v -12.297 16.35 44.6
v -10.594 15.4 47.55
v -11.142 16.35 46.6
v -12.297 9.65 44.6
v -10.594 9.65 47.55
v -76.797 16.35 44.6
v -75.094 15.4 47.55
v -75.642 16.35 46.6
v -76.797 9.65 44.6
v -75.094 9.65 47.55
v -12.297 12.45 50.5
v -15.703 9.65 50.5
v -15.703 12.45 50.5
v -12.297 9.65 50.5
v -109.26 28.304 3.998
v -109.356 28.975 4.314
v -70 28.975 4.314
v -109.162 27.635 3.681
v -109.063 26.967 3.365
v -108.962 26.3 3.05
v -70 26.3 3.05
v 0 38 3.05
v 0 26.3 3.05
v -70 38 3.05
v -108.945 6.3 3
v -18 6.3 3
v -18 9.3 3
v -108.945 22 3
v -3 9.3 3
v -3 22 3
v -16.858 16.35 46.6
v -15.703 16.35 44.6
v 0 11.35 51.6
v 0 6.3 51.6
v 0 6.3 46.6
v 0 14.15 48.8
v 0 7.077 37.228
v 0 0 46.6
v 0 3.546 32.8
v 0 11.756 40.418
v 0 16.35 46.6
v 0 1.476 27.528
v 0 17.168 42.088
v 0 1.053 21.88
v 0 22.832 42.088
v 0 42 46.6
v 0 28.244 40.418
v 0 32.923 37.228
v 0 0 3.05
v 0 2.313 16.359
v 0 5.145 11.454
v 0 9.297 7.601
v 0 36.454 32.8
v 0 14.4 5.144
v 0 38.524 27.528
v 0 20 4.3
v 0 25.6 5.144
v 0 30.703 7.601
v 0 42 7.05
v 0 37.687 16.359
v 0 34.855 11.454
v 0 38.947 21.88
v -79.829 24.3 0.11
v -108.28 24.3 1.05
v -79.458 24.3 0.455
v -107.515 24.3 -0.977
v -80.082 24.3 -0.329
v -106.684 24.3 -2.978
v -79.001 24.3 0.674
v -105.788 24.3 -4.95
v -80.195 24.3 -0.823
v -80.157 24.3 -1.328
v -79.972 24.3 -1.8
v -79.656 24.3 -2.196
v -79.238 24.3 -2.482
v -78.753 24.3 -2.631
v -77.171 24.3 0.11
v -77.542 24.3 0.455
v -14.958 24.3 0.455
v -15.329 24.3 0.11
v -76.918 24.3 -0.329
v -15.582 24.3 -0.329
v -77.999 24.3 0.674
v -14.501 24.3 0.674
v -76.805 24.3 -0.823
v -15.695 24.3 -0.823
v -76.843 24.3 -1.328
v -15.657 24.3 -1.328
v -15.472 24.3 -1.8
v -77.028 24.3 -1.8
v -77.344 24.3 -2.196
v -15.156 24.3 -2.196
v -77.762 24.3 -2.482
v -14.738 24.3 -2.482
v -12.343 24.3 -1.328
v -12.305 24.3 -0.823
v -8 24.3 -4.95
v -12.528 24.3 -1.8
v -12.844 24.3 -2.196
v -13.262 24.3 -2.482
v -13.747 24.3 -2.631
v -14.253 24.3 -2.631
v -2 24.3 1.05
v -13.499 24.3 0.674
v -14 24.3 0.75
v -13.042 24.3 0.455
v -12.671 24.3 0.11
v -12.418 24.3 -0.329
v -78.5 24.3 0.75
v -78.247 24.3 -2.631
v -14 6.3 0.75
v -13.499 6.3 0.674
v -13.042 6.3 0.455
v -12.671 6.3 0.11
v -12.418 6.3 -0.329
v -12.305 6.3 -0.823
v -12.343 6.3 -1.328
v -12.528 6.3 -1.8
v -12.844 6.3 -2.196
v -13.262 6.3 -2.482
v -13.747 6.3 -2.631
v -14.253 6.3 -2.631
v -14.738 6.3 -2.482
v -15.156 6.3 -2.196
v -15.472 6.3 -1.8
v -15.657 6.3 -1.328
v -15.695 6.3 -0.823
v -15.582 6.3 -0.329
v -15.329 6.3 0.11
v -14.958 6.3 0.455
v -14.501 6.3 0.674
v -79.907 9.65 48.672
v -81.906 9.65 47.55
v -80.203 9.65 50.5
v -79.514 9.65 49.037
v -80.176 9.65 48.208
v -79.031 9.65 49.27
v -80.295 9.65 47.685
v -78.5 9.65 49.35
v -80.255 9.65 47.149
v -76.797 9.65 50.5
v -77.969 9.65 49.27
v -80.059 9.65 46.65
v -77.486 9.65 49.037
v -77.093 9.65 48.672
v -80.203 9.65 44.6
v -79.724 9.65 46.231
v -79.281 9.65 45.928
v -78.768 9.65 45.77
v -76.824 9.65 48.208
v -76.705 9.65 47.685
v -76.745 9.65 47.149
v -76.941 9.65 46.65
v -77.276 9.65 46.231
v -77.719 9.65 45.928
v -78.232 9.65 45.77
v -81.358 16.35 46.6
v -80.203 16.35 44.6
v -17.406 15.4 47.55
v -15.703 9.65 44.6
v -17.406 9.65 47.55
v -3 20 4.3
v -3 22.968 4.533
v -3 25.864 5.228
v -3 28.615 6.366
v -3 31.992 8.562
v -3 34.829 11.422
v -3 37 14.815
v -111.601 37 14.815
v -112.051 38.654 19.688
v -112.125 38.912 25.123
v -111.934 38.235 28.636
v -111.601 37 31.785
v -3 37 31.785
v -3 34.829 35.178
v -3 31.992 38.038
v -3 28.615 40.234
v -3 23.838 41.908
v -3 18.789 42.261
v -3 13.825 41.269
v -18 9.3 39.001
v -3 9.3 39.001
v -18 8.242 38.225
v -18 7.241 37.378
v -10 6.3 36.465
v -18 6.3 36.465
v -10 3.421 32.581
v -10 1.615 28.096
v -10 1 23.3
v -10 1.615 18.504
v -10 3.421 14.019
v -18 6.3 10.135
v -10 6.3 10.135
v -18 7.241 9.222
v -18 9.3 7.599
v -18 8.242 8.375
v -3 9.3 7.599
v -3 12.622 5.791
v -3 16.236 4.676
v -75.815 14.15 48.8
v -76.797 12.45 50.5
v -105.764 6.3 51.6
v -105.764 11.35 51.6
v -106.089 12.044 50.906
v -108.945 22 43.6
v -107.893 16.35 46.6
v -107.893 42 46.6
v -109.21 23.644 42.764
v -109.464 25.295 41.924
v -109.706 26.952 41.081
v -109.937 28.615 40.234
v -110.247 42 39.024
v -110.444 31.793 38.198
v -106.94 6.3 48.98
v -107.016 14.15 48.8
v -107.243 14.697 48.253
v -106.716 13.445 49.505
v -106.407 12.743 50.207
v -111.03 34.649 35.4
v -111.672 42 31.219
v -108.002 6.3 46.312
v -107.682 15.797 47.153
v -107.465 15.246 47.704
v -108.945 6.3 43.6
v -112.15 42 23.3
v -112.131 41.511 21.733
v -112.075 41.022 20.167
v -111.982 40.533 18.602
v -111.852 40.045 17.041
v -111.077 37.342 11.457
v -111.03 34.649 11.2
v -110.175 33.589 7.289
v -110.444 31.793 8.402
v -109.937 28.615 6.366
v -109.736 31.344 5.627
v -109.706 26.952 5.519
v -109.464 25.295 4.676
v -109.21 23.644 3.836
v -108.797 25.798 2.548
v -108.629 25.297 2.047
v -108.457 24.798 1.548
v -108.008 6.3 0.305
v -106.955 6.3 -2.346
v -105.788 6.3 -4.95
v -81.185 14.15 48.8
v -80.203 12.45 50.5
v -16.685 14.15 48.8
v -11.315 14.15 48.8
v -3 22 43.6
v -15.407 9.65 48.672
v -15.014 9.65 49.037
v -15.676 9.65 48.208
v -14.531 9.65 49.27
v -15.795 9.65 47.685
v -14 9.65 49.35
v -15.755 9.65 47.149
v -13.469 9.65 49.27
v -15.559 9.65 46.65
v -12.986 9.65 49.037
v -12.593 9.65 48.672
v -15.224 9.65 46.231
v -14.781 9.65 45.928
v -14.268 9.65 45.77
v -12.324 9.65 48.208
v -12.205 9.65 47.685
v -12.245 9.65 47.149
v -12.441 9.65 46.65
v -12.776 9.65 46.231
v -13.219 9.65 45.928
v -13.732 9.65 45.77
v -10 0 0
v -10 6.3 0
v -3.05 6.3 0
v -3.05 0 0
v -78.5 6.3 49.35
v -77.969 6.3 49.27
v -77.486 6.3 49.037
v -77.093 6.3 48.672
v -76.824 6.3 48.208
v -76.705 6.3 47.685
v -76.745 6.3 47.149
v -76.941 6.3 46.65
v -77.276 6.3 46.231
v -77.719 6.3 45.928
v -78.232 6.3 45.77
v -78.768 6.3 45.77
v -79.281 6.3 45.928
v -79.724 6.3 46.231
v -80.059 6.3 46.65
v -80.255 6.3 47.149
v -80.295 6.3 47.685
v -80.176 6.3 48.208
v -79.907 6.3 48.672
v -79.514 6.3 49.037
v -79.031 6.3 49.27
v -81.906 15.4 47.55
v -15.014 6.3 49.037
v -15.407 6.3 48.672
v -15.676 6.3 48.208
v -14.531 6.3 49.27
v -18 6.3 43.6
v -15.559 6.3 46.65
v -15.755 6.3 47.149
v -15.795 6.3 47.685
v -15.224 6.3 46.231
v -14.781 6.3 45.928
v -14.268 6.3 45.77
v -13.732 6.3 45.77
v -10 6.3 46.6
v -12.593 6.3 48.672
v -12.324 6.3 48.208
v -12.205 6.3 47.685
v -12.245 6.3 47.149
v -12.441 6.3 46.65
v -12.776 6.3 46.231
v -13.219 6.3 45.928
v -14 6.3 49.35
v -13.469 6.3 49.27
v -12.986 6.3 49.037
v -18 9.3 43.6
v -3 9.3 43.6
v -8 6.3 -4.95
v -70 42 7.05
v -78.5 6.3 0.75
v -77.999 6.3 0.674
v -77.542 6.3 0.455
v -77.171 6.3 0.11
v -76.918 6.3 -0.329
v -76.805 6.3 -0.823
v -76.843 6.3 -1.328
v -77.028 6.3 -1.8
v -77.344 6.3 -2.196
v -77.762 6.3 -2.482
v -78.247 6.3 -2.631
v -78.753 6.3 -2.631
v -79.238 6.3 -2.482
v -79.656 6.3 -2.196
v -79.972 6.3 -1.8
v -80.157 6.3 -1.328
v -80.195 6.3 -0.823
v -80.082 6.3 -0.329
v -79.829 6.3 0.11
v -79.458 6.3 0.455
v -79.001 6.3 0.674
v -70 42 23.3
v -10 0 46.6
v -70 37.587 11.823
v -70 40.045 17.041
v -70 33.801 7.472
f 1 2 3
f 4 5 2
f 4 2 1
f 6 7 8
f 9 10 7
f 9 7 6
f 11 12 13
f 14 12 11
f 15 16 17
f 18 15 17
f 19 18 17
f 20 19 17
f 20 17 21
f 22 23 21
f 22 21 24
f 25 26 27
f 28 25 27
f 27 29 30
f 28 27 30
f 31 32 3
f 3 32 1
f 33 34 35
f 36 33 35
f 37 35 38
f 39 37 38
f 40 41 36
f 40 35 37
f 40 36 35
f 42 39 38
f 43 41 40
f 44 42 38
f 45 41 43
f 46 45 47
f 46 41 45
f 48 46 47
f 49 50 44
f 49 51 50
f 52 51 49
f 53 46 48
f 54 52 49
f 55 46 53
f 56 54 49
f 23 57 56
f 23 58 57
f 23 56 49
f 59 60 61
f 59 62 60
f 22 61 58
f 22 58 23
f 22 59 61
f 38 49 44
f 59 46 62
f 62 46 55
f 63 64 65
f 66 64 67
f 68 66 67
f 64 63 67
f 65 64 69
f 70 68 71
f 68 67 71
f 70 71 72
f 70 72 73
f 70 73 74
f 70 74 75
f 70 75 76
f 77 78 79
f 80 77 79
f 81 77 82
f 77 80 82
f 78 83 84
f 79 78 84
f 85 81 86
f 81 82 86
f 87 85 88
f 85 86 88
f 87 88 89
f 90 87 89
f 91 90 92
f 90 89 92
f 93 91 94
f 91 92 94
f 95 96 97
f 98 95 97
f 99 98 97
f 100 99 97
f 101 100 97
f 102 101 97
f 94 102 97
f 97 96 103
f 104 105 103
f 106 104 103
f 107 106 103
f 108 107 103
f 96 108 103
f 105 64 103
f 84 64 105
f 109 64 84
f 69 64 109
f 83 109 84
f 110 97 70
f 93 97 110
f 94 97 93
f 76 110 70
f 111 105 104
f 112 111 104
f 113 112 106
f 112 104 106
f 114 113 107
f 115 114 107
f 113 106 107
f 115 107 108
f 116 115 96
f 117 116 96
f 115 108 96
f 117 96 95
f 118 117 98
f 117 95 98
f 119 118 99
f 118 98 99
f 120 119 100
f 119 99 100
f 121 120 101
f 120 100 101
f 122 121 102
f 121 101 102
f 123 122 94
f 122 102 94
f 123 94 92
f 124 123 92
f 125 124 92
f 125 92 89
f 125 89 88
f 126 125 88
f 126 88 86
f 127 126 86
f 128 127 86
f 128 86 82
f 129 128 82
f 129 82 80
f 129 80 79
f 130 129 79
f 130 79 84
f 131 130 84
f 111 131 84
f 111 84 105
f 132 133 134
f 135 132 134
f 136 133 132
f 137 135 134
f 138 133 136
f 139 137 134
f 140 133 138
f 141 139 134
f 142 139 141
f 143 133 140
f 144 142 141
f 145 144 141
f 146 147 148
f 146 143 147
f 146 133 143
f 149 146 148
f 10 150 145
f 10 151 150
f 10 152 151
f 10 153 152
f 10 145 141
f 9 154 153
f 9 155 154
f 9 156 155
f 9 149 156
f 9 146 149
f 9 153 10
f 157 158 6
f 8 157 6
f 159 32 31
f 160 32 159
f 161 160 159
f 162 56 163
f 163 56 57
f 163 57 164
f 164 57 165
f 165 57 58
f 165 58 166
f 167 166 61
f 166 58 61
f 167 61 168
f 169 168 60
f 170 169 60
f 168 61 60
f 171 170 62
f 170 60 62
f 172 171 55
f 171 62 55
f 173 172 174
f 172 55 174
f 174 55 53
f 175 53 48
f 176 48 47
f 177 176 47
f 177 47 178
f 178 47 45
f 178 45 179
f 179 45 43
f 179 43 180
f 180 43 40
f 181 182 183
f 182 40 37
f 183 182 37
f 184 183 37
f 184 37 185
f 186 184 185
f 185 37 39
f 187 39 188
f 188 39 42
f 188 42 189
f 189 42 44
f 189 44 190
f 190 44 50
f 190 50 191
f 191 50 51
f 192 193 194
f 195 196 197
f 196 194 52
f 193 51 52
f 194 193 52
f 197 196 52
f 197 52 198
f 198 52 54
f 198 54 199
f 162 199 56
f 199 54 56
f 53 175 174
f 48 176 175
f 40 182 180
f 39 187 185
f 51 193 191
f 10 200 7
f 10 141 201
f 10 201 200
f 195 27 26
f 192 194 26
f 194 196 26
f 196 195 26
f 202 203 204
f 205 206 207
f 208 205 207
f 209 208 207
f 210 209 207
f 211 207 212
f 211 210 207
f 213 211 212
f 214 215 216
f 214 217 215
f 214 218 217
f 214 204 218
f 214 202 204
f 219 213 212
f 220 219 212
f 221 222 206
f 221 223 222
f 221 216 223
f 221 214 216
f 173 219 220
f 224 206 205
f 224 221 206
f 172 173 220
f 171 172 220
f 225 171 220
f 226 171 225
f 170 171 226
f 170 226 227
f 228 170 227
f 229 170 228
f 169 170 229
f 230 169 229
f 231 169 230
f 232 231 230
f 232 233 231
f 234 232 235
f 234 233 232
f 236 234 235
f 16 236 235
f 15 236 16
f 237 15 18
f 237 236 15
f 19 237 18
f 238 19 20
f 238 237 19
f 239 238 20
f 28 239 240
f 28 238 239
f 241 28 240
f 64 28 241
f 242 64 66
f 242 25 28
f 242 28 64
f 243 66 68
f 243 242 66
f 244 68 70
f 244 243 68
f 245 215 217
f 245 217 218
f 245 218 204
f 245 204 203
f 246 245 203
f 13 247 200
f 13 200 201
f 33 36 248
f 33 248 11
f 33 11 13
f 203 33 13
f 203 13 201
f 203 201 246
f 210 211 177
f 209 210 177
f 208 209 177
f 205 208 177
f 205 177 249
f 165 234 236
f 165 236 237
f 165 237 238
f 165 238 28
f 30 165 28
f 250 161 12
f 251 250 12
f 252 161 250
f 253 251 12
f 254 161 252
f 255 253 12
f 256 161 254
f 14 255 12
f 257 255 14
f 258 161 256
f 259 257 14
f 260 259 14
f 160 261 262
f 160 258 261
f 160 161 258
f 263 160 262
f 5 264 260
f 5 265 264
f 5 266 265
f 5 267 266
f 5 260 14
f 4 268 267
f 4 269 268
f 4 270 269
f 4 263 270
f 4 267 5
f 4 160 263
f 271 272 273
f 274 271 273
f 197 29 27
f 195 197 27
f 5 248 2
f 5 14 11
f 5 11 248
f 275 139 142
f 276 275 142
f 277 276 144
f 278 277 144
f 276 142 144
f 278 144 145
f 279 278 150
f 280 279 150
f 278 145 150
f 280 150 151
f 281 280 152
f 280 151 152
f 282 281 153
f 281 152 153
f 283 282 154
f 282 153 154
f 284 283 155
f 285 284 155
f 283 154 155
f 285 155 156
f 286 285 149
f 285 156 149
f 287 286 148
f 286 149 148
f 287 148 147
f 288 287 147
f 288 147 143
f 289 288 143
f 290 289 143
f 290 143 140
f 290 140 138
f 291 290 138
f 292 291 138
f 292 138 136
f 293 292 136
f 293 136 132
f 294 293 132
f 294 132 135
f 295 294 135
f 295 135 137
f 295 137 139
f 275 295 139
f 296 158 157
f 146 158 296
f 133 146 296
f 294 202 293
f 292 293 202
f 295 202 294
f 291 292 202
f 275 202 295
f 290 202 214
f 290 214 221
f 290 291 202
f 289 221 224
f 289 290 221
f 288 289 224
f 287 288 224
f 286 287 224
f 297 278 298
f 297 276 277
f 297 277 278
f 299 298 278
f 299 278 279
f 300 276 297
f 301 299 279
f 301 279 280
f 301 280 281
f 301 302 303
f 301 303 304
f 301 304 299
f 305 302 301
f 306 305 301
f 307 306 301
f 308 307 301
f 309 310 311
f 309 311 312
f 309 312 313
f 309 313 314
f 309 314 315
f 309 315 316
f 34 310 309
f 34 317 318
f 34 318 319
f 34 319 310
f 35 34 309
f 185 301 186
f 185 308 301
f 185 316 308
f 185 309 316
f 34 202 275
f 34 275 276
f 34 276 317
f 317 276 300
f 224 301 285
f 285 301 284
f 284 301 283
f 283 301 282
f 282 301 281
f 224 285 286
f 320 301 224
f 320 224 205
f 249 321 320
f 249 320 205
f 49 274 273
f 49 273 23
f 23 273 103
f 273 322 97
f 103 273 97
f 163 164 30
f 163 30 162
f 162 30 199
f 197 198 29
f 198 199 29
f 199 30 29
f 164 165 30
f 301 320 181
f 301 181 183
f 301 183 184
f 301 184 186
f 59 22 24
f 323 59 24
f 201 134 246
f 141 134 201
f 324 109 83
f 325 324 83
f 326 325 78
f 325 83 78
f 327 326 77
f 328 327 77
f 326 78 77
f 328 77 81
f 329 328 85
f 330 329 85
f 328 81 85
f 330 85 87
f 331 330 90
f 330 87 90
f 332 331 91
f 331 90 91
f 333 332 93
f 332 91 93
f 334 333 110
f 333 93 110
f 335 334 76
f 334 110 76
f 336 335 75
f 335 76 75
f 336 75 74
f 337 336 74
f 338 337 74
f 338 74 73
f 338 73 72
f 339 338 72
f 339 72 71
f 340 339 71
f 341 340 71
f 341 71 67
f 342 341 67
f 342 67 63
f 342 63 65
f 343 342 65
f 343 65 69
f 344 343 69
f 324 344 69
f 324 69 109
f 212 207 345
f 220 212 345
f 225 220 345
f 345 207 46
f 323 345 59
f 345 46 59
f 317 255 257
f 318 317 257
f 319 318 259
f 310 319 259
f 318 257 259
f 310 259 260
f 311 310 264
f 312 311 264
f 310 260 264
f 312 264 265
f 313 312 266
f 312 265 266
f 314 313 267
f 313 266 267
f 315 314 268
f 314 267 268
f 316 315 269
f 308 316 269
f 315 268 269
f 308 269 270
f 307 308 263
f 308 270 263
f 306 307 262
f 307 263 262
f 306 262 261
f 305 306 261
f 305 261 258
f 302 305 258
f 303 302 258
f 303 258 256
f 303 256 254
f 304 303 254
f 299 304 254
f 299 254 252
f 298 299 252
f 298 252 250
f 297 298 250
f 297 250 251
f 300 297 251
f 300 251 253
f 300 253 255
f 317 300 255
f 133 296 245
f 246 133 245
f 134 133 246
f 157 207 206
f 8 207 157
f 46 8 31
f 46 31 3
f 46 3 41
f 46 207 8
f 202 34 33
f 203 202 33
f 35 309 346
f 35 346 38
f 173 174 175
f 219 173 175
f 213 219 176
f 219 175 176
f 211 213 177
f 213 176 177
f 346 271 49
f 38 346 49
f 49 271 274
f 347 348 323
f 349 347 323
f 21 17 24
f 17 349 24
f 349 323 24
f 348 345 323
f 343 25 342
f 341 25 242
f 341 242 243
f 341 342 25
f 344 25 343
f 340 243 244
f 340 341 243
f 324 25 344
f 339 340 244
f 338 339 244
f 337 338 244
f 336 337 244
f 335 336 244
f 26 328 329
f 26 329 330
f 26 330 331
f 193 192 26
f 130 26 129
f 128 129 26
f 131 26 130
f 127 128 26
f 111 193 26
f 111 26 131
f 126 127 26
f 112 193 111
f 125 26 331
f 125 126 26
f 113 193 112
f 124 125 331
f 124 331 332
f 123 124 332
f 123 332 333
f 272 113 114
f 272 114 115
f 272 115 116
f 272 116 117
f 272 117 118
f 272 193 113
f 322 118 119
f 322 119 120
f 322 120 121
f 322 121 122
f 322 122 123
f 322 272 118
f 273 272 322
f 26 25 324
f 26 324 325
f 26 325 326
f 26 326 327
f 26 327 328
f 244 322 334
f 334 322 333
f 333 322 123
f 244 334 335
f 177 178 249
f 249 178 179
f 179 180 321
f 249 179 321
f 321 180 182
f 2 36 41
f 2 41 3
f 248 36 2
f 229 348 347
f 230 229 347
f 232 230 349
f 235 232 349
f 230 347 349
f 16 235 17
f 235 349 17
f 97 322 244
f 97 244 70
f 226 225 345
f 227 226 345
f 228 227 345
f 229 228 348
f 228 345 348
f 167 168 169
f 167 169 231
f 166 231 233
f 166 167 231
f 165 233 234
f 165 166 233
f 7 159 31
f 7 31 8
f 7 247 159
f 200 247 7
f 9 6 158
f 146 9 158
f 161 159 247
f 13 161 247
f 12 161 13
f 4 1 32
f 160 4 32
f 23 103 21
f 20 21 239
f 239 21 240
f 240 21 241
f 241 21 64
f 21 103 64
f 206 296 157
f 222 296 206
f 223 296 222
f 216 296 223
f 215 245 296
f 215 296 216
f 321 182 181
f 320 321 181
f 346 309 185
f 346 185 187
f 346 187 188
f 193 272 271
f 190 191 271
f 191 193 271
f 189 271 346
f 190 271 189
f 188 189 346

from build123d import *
from build123d.topology import SkipClean

# Parameters (mm, degrees)
BOSS_EXTRUDE1_DEPTH            = 46.6
CUT_EXTRUDE1_REACH             = 137.409
SKETCH2_R                      = 19
SKETCH3_W                      = 3
SKETCH3_H                      = 30.7
BOSS_EXTRUDE2_DEPTH            = 120
SKETCH4_W                      = 5
SKETCH4_H                      = 7.85
BOSS_EXTRUDE3_DEPTH            = 120
SKETCH6_W                      = 3
SKETCH6_H                      = 35.7
BOSS_EXTRUDE4_DEPTH            = 120
SKETCH8_W                      = 4.95
SKETCH8_H                      = 35.7
BOSS_EXTRUDE5_DEPTH            = 120
BOSS_EXTRUDE7_DEPTH            = 117
CHAMFER2_SIZE                  = 8
M3_CLEARANCE_HOLE1_D           = 3.4
M3_CLEARANCE_HOLE1_ON_FACE_2_D = 3.4
SKETCH12_W                     = 8
SKETCH12_H                     = 17.7
CUT_EXTRUDE4_DEPTH             = 140.841195647
CHAMFER4_SIZE                  = 4
CHAMFER5_SIZE                  = 2
CUT_EXTRUDE5_START             = 6.3
CUT_EXTRUDE5_DEPTH             = 35.7
CUT_EXTRUDE6_START             = -70
CUT_EXTRUDE6_DEPTH             = 61.400086431
CUT_EXTRUDE7_START             = -4.5
CUT_EXTRUDE7_DEPTH             = 6.7
M3_CLEARANCE_HOLE2_D           = 3.6
M3_CLEARANCE_HOLE2_DEPTH       = 12.65
CHAMFER6_SIZE                  = 2.2
CUT_EXTRUDE8_DEPTH             = 131.400086431


# Read off the part's stored shape, not the designer's step: Cut-Extrude5
with BuildPart() as part:
    # Sketch1 → Boss-Extrude1 (new body)
    with BuildSketch(Plane.XY):
        Polygon((0, 0), (0, 42), (-120, 42), (-120, 37), (-3, 37), (-3, 9.3), (-18, 9.3), (-18, 6.3), (-10, 6.3), (-10, 0), align=None)
    extrude(amount=BOSS_EXTRUDE1_DEPTH)

    # Sketch2 → Cut-Extrude1 (cut, up to next)
    with BuildSketch(Plane(origin=(0, 0, 0), x_dir=(0, 0, -1), z_dir=(1, 0, 0)), mode=Mode.PRIVATE) as cut_extrude1_sk1:
        with Locations((-23.3, 20)):
            Circle(SKETCH2_R)
    cut_extrude1_tool1 = extrude(cut_extrude1_sk1.sketch, amount=-CUT_EXTRUDE1_REACH, mode=Mode.PRIVATE) & part.part
    add(cut_extrude1_tool1.solids().sort_by_distance((0, 20, 23.3))[0], mode=Mode.SUBTRACT)

    # Sketch3 → Boss-Extrude2 (add)
    with BuildSketch(Plane.ZY.offset(3)):
        with Locations((45.1, 21.65)):
            Rectangle(SKETCH3_W, SKETCH3_H)
    extrude(amount=BOSS_EXTRUDE2_DEPTH)

    # Sketch4 → Boss-Extrude3 (add)
    with BuildSketch(Plane(origin=(0, 0, 0), x_dir=(0, 0, -1), z_dir=(1, 0, 0))):
        with Locations((-49.1, 10.225)):
            Rectangle(SKETCH4_W, SKETCH4_H)
    extrude(amount=-BOSS_EXTRUDE3_DEPTH)

    # Sketch6 → Boss-Extrude4 (add)
    with BuildSketch(Plane(origin=(0, 0, 0), x_dir=(0, 0, -1), z_dir=(1, 0, 0))):
        with Locations((-1.5, 24.15)):
            Rectangle(SKETCH6_W, SKETCH6_H)
    extrude(amount=-BOSS_EXTRUDE4_DEPTH)

    # Sketch8 → Boss-Extrude5 (add)
    with BuildSketch(Plane(origin=(0, 0, 0), x_dir=(0, 0, -1), z_dir=(1, 0, 0))):
        with Locations((2.475, 24.15)):
            Rectangle(SKETCH8_W, SKETCH8_H)
    extrude(amount=-BOSS_EXTRUDE5_DEPTH)

    # Sketch14 → Boss-Extrude7 (add)
    with SkipClean():  # the faces are left unmerged after this step: merging them gives an invalid solid
        with BuildSketch(Plane.ZY.offset(3)):
            with BuildLine():
                Line((6.365553185, 28.615364824), (3, 22))
                Line((3, 22), (3, 37))
                Line((3, 37), (14.814718626, 37))
                ThreePointArc((14.814718626, 37), (9.91657099, 33.486431253), (6.365553185, 28.615364824))
            make_face()
            with BuildLine():
                Line((40.234446815, 28.615364824), (43.6, 22))
                Line((43.6, 22), (43.6, 37))
                Line((43.6, 37), (31.785281374, 37))
                ThreePointArc((31.785281374, 37), (36.68342901, 33.486431253), (40.234446815, 28.615364824))
            make_face()
        extrude(amount=BOSS_EXTRUDE7_DEPTH)

    # Chamfer2
    chamfer2_edges = [part.edges().sort_by_distance(p)[0] for p in [
        (0, 24.15, -4.95),
    ]]
    chamfer(chamfer2_edges, length=CHAMFER2_SIZE)

    # M3 Clearance Hole1 (through all)
    with Locations(Plane(origin=(-14, 0, -0.95), x_dir=(0, 0, -1), z_dir=(0, -1, 0))):
        with Locations((0, 0)):
            Hole(M3_CLEARANCE_HOLE1_D / 2)

    # M3 Clearance Hole1 on face 2 (through all)
    with Locations(Plane(origin=(-78.5, -3, -0.95), x_dir=(0, 0, -1), z_dir=(0, -1, 0))):
        with Locations((0, 0)):
            Hole(M3_CLEARANCE_HOLE1_ON_FACE_2_D / 2)

    # Sketch12 → Cut-Extrude4 (cut, through all)
    with SkipClean():  # the faces are left unmerged after this step: merging them gives an invalid solid
        with BuildSketch(Plane(origin=(0, 0, 0), x_dir=(0, 0, -1), z_dir=(1, 0, 0))):
            with Locations((0.95, 33.15)):
                Rectangle(SKETCH12_W, SKETCH12_H)
        extrude(amount=-CUT_EXTRUDE4_DEPTH, mode=Mode.SUBTRACT)

    # Chamfer4
    chamfer4_edges = [part.edges().sort_by_distance(p)[0] for p in [
        (-60, 42, 3.05),
    ]]
    chamfer(chamfer4_edges, length=CHAMFER4_SIZE)

    # Chamfer5
    chamfer5_edges = [part.edges().sort_by_distance(p)[0] for p in [
        (-60, 24.3, 3.05),
    ]]
    chamfer(chamfer5_edges, length=CHAMFER5_SIZE)

    # Cut-Extrude5 outline → Cut-Extrude5 (cut)
    with SkipClean():  # the faces are left unmerged after this step: merging them gives an invalid solid
        with BuildSketch(Plane(origin=(0, 0, 0), x_dir=(1, 0, 0), z_dir=(0, 1, 0)).offset(CUT_EXTRUDE5_START)):
            with BuildLine():
                Line((-120, -51.6), (-105.764031959, -51.6))
                ThreePointArc((-105.764031959, -51.6), (-112.149994188, -23.327677022), (-105.787782122, 4.95))
                Line((-105.787782122, 4.95), (-120, 4.95))
                Line((-120, 4.95), (-120, -43.6))
                Line((-120, -43.6), (-123, -43.6))
                Line((-123, -43.6), (-123, -46.6))
                Line((-123, -46.6), (-120, -46.6))
                Line((-120, -46.6), (-120, -51.6))
            make_face()
        extrude(amount=CUT_EXTRUDE5_DEPTH, mode=Mode.SUBTRACT)

    # Sketch16 → Cut-Extrude6 (cut, through all)
    with SkipClean():  # the faces are left unmerged after this step: merging them gives an invalid solid
        with BuildSketch(Plane(origin=(0, 0, 0), x_dir=(0, 0, -1), z_dir=(1, 0, 0)).offset(CUT_EXTRUDE6_START)):
            with BuildLine():
                Line((-3.05, 26.3), (-3.05, 42))
                Line((-3.05, 42), (-23.3, 42))
                Line((-23.3, 42), (-17.040626863, 40.045454545))
                ThreePointArc((-17.040626863, 40.045454545), (-9.51709951, 35.84397848), (-4.314345847, 28.97468308))
                Line((-4.314345847, 28.97468308), (-3.05, 26.3))
            make_face()
        extrude(amount=-CUT_EXTRUDE6_DEPTH, mode=Mode.SUBTRACT)

    # Sketch18 → Cut-Extrude7 (cut)
    with SkipClean():  # the faces are left unmerged after this step: merging them gives an invalid solid
        with BuildSketch(Plane(origin=(0, 14.15, 0), x_dir=(1, 0, 0), z_dir=(0, 1, 0)).offset(CUT_EXTRUDE7_START)):
            Polygon((-10.593633412, -47.55), (-12.296816706, -44.6), (-15.703183294, -44.6), (-17.406366588, -47.55), (-15.703183294, -50.5), (-12.296816706, -50.5), align=None)
            Polygon((-81.906366588, -47.55), (-80.203183294, -50.5), (-76.796816706, -50.5), (-75.093633412, -47.55), (-76.796816706, -44.6), (-80.203183294, -44.6), align=None)
        extrude(amount=CUT_EXTRUDE7_DEPTH, mode=Mode.SUBTRACT)

    # M3 Clearance Hole2
    with Locations(Plane(origin=(-78.5, -3, 47.55), x_dir=(0, 0, -1), z_dir=(0, -1, 0))):
        with Locations((0, 0), (0, 64.5)):
            Hole(M3_CLEARANCE_HOLE2_D / 2, depth=M3_CLEARANCE_HOLE2_DEPTH)

    # Chamfer6
    chamfer6_edges = [part.edges().sort_by_distance(p)[0] for p in [
        (-94.625687487, 14.15, 46.6),
        (-46.25, 14.15, 46.6),
        (-5.571058084, 14.15, 46.6),
    ]]
    chamfer(chamfer6_edges, length=CHAMFER6_SIZE)

    # Sketch23 → Cut-Extrude8 (cut, through all)
    with SkipClean():  # the faces are left unmerged after this step: merging them gives an invalid solid
        with BuildSketch(Plane(origin=(0, 0, 0), x_dir=(0, 0, -1), z_dir=(1, 0, 0))):
            Polygon((-48.8, 14.15), (-51.6, 11.35), (-51.6, 14.15), align=None)
        extrude(amount=-CUT_EXTRUDE8_DEPTH, mode=Mode.SUBTRACT)


solid = part.part
